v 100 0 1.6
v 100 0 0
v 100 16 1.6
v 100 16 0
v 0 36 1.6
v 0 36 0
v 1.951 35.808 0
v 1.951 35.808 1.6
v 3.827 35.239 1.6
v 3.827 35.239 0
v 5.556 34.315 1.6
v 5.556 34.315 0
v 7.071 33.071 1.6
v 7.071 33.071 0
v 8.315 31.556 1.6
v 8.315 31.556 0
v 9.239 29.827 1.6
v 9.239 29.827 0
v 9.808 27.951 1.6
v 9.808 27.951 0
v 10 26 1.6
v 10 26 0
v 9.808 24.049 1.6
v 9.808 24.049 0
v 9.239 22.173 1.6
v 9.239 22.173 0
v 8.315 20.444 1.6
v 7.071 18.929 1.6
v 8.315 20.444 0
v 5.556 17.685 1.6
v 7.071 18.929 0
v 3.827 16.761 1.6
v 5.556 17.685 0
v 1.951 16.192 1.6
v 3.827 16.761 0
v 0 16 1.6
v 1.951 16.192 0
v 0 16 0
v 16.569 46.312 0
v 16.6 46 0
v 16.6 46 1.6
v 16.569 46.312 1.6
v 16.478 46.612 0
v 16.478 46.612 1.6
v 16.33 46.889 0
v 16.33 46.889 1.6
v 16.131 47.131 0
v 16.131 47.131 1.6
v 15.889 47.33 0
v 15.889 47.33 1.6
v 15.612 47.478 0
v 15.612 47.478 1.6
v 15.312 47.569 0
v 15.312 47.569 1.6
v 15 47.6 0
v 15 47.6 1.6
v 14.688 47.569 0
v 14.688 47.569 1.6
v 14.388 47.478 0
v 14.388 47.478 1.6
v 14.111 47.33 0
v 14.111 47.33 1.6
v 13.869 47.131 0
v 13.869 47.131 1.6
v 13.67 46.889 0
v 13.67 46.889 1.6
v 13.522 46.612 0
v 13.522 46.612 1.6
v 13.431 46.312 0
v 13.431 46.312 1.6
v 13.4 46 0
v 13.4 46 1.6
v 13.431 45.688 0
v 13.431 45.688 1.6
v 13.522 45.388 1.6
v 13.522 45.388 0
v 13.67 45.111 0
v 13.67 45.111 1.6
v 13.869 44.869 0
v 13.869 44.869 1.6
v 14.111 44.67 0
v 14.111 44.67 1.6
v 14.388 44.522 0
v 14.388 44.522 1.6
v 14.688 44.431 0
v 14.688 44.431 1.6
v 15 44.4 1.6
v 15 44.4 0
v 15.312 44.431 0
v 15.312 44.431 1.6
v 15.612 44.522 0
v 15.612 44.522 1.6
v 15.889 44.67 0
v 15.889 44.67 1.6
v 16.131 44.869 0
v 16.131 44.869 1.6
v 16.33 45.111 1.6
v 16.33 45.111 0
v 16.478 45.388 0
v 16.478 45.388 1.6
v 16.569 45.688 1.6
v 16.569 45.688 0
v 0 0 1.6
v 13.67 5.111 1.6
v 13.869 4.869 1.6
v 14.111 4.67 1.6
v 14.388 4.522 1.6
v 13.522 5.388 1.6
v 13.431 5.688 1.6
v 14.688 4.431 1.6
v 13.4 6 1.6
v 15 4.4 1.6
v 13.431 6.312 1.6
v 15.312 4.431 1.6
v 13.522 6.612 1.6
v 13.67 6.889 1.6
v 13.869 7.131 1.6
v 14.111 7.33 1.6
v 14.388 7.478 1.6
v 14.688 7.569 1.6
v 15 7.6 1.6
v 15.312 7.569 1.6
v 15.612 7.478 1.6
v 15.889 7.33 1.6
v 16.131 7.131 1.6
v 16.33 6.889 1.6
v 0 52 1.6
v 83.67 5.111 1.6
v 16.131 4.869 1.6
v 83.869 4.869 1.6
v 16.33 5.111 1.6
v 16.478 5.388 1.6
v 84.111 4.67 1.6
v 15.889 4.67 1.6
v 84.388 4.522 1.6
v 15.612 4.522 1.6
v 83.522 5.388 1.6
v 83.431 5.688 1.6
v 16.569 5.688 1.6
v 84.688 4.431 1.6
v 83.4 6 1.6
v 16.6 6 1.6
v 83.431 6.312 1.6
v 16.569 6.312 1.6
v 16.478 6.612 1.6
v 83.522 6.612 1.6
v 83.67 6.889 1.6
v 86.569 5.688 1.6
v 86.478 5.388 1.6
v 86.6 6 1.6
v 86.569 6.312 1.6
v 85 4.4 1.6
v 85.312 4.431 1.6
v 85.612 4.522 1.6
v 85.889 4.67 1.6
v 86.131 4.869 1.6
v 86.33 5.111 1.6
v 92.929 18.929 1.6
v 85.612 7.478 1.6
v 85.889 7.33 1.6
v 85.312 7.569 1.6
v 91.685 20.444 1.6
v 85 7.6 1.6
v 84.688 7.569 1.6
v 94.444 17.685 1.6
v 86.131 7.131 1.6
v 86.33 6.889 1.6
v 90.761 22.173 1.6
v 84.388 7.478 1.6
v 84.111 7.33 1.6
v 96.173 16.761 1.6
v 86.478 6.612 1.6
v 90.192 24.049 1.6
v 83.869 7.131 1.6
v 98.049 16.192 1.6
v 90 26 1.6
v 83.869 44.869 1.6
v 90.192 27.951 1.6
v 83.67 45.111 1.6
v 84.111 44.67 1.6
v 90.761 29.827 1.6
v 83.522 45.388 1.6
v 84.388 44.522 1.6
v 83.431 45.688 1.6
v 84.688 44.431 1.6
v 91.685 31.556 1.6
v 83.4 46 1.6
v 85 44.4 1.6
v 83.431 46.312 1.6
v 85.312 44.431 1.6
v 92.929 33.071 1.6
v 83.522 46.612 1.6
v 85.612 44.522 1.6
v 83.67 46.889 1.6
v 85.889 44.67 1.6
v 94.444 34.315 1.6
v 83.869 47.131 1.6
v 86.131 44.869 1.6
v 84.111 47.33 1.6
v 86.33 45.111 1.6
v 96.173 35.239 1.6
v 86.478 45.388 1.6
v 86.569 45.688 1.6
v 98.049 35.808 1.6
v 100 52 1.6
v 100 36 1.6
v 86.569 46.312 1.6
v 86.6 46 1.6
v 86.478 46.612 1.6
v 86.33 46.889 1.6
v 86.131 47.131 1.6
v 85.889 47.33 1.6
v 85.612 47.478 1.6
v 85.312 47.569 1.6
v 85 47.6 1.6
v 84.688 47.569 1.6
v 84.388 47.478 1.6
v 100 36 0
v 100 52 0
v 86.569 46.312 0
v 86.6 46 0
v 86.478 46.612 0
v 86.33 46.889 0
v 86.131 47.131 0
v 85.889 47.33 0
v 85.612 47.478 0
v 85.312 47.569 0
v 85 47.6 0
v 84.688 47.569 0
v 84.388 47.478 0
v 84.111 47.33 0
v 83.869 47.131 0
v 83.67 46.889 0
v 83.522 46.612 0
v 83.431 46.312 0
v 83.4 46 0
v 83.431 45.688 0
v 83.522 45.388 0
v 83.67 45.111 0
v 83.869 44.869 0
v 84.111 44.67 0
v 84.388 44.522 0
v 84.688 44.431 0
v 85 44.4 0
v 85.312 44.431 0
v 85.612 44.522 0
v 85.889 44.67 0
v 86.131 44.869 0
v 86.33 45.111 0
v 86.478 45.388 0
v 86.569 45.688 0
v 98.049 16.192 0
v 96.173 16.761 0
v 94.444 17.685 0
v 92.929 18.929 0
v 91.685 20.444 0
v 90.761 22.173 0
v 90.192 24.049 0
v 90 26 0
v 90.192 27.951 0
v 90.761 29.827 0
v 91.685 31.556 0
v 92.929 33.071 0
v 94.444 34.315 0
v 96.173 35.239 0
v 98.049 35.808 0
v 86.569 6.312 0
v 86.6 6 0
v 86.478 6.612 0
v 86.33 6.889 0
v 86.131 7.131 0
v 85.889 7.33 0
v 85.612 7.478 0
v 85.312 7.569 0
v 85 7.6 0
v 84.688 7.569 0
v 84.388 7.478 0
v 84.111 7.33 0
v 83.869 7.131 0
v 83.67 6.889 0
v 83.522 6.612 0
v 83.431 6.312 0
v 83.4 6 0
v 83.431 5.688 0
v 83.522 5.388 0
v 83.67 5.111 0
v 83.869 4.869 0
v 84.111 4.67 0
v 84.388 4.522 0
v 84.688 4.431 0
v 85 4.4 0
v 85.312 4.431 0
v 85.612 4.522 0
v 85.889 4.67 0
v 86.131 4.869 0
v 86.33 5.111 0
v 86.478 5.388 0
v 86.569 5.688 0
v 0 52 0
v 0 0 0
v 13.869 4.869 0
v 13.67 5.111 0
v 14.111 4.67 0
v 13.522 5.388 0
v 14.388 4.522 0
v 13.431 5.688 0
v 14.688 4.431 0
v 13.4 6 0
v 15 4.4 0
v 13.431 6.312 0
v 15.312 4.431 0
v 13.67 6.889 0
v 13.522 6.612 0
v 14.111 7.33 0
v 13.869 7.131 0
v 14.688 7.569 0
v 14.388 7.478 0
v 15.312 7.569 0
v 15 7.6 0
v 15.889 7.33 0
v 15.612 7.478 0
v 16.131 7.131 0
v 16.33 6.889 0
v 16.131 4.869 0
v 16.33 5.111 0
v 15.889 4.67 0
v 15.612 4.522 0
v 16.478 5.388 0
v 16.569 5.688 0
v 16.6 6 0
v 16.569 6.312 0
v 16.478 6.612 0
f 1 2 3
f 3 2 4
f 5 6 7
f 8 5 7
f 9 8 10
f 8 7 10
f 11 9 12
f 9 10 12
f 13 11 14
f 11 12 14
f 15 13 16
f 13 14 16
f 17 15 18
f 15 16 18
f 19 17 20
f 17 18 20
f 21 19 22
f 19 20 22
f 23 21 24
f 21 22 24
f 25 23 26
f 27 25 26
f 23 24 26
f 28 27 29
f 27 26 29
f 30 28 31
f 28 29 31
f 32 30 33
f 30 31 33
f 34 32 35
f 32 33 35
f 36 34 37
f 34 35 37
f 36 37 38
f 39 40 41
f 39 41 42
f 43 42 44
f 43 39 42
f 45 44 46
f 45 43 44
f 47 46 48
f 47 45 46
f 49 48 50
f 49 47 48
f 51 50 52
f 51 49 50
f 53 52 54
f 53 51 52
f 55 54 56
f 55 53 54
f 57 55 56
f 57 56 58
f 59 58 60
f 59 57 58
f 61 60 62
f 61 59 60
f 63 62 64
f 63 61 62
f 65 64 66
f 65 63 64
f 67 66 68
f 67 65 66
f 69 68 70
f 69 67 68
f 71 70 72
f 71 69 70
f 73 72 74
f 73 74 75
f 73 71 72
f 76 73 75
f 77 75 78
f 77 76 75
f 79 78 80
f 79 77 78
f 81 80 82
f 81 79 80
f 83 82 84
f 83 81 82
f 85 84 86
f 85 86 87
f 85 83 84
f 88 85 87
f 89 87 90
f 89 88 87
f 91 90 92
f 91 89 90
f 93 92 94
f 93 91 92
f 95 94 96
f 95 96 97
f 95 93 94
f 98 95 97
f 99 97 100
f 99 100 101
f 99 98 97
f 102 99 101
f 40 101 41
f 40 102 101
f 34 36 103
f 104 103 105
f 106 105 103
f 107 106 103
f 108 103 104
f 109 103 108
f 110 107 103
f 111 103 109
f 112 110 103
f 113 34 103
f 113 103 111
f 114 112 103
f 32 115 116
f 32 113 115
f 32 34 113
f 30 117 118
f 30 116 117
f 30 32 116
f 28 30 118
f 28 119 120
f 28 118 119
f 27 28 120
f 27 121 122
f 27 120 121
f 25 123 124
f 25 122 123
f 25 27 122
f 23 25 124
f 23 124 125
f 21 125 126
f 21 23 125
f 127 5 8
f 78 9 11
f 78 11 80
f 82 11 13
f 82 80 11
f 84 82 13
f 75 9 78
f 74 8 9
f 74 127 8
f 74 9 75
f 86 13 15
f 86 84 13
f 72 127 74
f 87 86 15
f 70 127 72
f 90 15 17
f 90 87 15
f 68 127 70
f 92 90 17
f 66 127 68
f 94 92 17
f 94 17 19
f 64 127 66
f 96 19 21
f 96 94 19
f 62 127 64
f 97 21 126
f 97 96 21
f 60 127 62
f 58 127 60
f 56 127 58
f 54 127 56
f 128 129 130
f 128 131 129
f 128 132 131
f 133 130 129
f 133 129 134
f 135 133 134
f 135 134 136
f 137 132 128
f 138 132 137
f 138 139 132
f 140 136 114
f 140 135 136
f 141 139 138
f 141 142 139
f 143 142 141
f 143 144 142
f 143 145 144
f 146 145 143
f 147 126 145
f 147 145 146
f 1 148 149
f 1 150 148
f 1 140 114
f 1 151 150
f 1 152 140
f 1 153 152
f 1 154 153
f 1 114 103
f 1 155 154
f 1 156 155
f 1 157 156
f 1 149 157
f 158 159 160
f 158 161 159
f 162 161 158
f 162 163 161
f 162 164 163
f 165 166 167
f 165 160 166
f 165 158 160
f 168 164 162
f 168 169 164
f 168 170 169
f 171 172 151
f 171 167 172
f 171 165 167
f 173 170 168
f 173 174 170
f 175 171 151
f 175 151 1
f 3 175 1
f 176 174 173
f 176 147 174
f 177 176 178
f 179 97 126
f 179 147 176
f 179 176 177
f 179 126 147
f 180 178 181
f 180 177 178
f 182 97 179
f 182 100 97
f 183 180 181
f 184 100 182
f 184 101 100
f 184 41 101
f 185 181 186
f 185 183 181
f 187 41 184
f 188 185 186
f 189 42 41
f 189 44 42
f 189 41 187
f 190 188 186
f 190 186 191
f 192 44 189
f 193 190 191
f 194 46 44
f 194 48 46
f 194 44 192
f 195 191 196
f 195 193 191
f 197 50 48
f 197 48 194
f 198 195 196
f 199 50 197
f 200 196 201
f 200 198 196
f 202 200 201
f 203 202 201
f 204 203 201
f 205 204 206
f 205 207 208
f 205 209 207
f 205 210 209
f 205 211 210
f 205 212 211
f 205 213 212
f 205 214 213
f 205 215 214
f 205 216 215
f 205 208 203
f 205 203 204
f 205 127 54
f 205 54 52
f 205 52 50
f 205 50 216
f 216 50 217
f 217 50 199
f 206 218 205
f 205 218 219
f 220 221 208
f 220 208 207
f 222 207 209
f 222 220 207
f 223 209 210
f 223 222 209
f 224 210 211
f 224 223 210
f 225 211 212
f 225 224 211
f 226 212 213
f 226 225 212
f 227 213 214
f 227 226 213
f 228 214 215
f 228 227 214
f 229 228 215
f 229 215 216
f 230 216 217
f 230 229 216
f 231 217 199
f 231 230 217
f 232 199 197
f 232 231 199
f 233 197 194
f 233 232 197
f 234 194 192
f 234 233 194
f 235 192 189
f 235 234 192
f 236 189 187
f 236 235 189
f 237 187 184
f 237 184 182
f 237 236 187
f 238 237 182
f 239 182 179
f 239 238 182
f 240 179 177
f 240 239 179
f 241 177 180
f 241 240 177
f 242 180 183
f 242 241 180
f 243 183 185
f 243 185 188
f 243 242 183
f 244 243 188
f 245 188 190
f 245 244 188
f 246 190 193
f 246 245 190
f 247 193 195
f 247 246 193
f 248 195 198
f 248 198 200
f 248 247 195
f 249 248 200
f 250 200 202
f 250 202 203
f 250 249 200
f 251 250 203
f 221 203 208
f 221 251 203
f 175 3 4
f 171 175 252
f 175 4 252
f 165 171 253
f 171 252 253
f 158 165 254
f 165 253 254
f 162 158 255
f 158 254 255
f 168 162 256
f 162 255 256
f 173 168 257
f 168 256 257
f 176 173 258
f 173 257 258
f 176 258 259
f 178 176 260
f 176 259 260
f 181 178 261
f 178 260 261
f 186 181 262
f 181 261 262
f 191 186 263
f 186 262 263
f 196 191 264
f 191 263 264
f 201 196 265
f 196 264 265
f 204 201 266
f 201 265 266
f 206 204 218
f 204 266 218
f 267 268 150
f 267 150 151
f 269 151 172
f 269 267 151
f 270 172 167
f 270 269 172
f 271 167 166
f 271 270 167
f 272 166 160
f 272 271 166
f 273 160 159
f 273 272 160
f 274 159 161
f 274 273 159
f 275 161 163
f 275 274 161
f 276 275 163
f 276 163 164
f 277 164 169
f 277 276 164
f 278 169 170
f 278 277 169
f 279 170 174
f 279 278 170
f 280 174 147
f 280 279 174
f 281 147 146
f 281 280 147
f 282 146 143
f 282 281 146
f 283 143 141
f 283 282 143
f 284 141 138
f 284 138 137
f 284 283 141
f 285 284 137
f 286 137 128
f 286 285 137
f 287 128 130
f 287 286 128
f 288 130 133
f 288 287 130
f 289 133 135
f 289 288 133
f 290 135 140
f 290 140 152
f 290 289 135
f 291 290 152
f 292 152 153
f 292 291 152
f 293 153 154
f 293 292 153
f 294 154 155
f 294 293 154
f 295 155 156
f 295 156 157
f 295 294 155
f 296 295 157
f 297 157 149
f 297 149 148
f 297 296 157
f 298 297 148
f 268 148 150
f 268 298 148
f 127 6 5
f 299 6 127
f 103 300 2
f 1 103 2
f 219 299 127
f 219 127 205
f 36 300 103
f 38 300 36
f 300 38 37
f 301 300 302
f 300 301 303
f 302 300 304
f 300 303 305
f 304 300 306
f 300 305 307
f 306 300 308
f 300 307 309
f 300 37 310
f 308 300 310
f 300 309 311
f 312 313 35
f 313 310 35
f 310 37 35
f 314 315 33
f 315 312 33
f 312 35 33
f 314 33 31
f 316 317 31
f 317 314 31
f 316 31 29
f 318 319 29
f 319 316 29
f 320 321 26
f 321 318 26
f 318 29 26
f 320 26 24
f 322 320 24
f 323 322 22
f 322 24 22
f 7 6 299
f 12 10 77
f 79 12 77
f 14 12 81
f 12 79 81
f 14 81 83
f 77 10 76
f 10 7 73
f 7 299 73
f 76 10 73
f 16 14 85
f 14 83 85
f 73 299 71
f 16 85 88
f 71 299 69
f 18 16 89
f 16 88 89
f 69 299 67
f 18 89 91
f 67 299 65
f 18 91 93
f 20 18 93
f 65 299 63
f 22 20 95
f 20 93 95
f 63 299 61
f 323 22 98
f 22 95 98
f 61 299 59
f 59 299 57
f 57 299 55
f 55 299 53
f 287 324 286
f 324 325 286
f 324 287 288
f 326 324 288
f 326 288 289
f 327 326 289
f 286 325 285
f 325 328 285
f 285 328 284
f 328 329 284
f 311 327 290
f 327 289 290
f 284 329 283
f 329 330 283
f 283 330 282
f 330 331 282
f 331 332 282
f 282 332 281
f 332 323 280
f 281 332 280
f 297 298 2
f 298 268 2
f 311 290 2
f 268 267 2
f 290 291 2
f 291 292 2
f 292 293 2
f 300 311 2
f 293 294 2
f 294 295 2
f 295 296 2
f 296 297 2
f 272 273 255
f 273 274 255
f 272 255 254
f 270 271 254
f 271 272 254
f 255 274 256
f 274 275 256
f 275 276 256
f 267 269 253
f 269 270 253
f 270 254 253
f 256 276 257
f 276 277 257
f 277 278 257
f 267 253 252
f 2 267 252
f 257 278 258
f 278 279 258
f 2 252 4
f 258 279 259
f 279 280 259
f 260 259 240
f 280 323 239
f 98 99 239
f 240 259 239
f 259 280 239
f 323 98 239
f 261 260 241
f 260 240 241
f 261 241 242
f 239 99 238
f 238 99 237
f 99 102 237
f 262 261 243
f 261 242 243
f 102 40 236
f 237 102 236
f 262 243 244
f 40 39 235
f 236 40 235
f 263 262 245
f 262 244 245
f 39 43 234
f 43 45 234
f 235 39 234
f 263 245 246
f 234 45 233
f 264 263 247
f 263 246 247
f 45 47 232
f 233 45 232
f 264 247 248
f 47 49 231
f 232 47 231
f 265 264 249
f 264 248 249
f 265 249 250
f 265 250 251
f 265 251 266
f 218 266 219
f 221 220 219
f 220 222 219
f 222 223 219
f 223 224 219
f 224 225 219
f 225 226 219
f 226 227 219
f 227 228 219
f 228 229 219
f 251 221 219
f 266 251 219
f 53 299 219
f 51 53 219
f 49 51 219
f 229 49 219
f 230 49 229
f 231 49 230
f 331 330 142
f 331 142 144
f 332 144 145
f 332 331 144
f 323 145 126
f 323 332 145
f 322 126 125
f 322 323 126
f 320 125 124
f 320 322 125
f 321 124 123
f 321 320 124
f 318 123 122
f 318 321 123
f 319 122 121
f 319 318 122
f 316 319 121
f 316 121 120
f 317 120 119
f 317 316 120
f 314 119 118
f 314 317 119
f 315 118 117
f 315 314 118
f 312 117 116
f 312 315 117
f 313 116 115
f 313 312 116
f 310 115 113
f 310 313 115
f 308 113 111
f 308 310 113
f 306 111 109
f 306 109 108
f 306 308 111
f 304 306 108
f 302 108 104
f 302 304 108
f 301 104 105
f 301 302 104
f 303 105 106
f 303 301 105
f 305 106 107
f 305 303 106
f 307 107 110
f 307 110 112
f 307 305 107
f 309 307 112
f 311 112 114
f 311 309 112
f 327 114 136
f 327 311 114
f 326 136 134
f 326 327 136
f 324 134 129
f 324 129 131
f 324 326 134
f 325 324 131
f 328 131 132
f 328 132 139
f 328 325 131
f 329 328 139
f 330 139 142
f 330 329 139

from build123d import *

# Parameters (mm, degrees)
ESQUISSE1_W             = 100
ESQUISSE1_H             = 52
ESQUISSE1_R             = 1.6
BOSS_EXTRU_1_DEPTH      = 1.6
ESQUISSE2_R             = 10
ENL_V_MAT_EXTRU_1_DEPTH = 113.723378232


with BuildPart() as part:
    # Esquisse1 → Boss.-Extru.1 (new body)
    with BuildSketch(Plane.XY):
        with Locations((50, 26)):
            Rectangle(ESQUISSE1_W, ESQUISSE1_H)
        with Locations((15, 46)):
            Circle(ESQUISSE1_R, mode=Mode.SUBTRACT)
        with Locations((85, 46)):
            Circle(ESQUISSE1_R, mode=Mode.SUBTRACT)
        with Locations((15, 6)):
            Circle(ESQUISSE1_R, mode=Mode.SUBTRACT)
        with Locations((85, 6)):
            Circle(ESQUISSE1_R, mode=Mode.SUBTRACT)
    extrude(amount=BOSS_EXTRU_1_DEPTH)

    # Esquisse2 → Enlèv. mat.-Extru.1 (cut, through all)
    with BuildSketch(Plane(origin=(0, 0, 0), x_dir=(-1, 0, 0), z_dir=(0, 0, -1))):
        with Locations((-100, 26)):
            Circle(ESQUISSE2_R)
        with Locations((0, 26)):
            Circle(ESQUISSE2_R)
    extrude(amount=-ENL_V_MAT_EXTRU_1_DEPTH, mode=Mode.SUBTRACT)


solid = part.part
